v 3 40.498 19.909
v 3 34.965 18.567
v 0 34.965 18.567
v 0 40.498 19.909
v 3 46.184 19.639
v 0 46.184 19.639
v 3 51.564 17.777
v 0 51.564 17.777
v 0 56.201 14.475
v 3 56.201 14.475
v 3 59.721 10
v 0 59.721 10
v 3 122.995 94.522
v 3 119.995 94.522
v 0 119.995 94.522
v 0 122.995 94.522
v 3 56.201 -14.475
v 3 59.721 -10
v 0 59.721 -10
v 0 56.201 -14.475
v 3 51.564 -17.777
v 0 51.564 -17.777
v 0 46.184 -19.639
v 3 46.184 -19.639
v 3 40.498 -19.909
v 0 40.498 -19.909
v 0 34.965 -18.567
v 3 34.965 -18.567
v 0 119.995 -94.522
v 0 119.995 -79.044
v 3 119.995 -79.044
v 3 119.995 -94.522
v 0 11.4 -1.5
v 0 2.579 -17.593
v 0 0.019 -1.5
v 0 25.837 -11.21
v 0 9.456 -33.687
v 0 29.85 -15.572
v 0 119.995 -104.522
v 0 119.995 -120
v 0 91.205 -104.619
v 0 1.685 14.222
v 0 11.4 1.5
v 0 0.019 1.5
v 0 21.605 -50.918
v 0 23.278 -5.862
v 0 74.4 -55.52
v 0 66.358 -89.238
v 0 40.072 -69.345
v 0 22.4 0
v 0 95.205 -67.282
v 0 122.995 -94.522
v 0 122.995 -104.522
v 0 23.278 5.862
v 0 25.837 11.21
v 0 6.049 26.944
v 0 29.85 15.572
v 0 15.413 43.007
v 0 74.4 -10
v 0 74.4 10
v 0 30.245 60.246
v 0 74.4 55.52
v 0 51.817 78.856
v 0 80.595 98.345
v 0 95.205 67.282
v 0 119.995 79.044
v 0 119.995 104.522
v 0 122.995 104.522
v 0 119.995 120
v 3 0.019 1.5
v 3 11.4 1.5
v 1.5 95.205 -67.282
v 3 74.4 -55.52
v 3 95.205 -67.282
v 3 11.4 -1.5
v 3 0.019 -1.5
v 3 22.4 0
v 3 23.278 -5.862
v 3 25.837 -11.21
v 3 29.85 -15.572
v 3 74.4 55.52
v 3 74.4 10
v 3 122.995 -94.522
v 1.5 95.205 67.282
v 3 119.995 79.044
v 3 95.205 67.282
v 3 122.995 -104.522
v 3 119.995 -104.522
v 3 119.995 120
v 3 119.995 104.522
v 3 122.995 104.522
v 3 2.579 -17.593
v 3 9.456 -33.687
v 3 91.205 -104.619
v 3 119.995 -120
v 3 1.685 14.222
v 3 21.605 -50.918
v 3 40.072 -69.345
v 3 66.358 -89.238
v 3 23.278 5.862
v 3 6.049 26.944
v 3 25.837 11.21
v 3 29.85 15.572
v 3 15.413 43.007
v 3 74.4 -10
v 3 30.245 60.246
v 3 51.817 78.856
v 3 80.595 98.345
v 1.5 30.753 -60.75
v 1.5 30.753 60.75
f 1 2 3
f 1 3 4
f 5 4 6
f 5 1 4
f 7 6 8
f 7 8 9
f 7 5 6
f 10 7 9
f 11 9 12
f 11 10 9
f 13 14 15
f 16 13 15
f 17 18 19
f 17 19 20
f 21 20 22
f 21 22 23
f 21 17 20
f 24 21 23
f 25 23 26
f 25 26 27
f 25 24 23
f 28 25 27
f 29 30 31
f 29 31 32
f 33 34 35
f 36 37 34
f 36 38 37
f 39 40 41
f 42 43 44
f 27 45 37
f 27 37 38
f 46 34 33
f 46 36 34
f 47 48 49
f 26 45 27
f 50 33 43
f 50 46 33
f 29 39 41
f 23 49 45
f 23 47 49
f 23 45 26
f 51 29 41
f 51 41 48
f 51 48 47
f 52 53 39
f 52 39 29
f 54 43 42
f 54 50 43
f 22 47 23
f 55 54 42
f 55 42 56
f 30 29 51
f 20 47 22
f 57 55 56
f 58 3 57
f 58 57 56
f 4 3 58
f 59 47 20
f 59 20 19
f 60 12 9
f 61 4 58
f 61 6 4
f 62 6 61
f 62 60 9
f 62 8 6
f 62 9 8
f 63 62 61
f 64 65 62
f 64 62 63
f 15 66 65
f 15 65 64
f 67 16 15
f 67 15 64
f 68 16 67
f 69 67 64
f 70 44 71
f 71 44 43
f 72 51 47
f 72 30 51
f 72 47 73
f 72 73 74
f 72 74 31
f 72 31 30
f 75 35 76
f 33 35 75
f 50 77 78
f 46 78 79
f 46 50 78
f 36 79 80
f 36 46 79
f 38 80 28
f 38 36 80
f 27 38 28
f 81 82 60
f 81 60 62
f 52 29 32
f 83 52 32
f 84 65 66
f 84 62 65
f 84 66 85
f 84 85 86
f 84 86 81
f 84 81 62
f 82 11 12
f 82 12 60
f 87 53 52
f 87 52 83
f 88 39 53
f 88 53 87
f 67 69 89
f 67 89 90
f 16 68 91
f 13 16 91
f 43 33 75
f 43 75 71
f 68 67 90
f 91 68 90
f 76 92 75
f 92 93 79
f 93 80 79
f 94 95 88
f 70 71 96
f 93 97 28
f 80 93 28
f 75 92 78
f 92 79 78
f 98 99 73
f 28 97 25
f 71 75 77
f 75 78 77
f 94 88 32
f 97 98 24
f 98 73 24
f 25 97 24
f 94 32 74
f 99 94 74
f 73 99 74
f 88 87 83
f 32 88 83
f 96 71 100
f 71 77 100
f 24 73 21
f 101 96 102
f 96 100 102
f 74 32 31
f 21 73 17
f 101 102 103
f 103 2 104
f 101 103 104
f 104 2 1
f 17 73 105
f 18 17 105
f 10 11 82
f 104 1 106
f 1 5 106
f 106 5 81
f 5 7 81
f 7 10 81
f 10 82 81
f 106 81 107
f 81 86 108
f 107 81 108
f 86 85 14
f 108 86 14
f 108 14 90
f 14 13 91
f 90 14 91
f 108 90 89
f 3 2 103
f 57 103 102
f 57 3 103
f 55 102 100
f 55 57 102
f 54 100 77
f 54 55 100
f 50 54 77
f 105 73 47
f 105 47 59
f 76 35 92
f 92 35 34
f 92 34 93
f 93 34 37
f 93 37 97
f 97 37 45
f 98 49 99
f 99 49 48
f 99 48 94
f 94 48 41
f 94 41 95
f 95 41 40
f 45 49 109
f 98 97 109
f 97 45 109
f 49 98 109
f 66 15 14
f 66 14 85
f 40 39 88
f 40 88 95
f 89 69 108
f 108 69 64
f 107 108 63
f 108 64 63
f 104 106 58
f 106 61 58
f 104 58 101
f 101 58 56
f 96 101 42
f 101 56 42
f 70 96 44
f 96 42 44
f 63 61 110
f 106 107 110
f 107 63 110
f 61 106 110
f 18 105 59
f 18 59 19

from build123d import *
from build123d.topology import SkipClean

# Parameters (mm, degrees)
EXTRUDE_1_DEPTH          = 3
SKETCH_2_W               = 3
SKETCH_2_H               = 10
EXTRUDE_2_DEPTH          = 3
EXTRUDE_3_DEPTH          = 3
CUT_EXTRUDE_1_DEPTH      = 172.862791995
CUT_EXTRUDE_1_DEPTH_BACK = 3
SKETCH_4_W               = 3
SKETCH_4_H               = 15.330567524
CUT_EXTRUDE_2_DEPTH      = 172.862791995


with BuildPart() as part:
    # 草图1 → 凸台-拉伸1 (new body)
    with BuildSketch(Plane(origin=(0, 0, 0), x_dir=(0, 0, -1), z_dir=(1, 0, 0))):
        with BuildLine():
            Line((-120, 119.995200001), (-79.04385574, 119.995200001))
            add(Edge.make_bspline(
                [(-79.04385574, 119.995200001), (0, -59.995200001), (79.04385574, 119.995200001)],
                knots=[0.203375214, 0.203375214, 0.203375214, 0.796624786, 0.796624786, 0.796624786], degree=2))
            Line((79.04385574, 119.995200001), (120, 119.995200001))
            add(Edge.make_bspline(
                [(-120, 119.995200001), (0, -119.995200001), (120, 119.995200001)],
                knots=[0.056028977, 0.056028977, 0.056028977, 0.943971023, 0.943971023, 0.943971023], degree=2))
        make_face()
    extrude(amount=EXTRUDE_1_DEPTH)

    # 草图2 → 凸台-拉伸2 (add)
    with BuildSketch(Plane(origin=(0, 119.995200001, 0), x_dir=(1, 0, 0), z_dir=(0, 1, 0))):
        with Locations((1.5, -99.52192787)):
            Rectangle(SKETCH_2_W, SKETCH_2_H)
        with Locations((1.5, 99.52192787)):
            Rectangle(SKETCH_2_W, SKETCH_2_H)
    extrude(amount=EXTRUDE_2_DEPTH)

    # 草图3 → 凸台-拉伸3 (add)
    with BuildSketch(Plane(origin=(3, 0, 0), x_dir=(0, 0, -1), z_dir=(1, 0, 0))):
        with BuildLine():
            ThreePointArc((10, 59.720508076), (18.900244528, 48.940700022), (18.566840065, 34.96545563))
            add(Edge.make_bspline(
                [(55.520060246, 74.4), (37.043450156, 44.848105266), (18.566840065, 34.96545563)],
                knots=[0, 0, 0, 1, 1, 1], degree=2))
            Line((55.520060246, 74.4), (10, 74.4))
            Line((10, 74.4), (10, 59.720508076))
        make_face()
        with BuildLine():
            Line((-10, 74.4), (-55.520060246, 74.4))
            add(Edge.make_bspline(
                [(-18.566840065, 34.96545563), (-37.043450156, 44.848105266), (-55.520060246, 74.4)],
                knots=[0, 0, 0, 1, 1, 1], degree=2))
            ThreePointArc((-18.566840065, 34.96545563), (-18.900244528, 48.940700022), (-10, 59.720508076))
            Line((-10, 59.720508076), (-10, 74.4))
        make_face()
    extrude(amount=-EXTRUDE_3_DEPTH)

    # 草图3<3> → 切除-拉伸1 (cut, two sides: drawn at the far end of the back side and taken through both)
    with SkipClean():  # the faces are left unmerged after this step: merging them gives an invalid solid
        with BuildSketch(Plane(origin=(3, 0, 0), x_dir=(0, 0, -1), z_dir=(1, 0, 0)).offset(-CUT_EXTRUDE_1_DEPTH_BACK)):
            with BuildLine():
                add(Edge.make_bspline(
                    [(18.566840065, 34.96545563), (0, 25.03454437), (-18.566840065, 34.96545563)],
                    knots=[0.430324946, 0.430324946, 0.430324946, 0.569675054, 0.569675054, 0.569675054], degree=2))
                ThreePointArc((-18.566840065, 34.96545563), (-11.209574314, 25.836623421), (0, 22.4))
                ThreePointArc((0, 22.4), (11.209574314, 25.836623421), (18.566840065, 34.96545563))
            make_face()
        extrude(amount=CUT_EXTRUDE_1_DEPTH + CUT_EXTRUDE_1_DEPTH_BACK, mode=Mode.SUBTRACT)

    # 草图4 → 切除-拉伸2 (cut, through all)
    with SkipClean():  # the faces are left unmerged after this step: merging them gives an invalid solid
        with BuildSketch(Plane.ZY):
            with Locations((0, 3.734716238)):
                Rectangle(SKETCH_4_W, SKETCH_4_H)
        extrude(amount=-CUT_EXTRUDE_2_DEPTH, mode=Mode.SUBTRACT)


solid = part.part
